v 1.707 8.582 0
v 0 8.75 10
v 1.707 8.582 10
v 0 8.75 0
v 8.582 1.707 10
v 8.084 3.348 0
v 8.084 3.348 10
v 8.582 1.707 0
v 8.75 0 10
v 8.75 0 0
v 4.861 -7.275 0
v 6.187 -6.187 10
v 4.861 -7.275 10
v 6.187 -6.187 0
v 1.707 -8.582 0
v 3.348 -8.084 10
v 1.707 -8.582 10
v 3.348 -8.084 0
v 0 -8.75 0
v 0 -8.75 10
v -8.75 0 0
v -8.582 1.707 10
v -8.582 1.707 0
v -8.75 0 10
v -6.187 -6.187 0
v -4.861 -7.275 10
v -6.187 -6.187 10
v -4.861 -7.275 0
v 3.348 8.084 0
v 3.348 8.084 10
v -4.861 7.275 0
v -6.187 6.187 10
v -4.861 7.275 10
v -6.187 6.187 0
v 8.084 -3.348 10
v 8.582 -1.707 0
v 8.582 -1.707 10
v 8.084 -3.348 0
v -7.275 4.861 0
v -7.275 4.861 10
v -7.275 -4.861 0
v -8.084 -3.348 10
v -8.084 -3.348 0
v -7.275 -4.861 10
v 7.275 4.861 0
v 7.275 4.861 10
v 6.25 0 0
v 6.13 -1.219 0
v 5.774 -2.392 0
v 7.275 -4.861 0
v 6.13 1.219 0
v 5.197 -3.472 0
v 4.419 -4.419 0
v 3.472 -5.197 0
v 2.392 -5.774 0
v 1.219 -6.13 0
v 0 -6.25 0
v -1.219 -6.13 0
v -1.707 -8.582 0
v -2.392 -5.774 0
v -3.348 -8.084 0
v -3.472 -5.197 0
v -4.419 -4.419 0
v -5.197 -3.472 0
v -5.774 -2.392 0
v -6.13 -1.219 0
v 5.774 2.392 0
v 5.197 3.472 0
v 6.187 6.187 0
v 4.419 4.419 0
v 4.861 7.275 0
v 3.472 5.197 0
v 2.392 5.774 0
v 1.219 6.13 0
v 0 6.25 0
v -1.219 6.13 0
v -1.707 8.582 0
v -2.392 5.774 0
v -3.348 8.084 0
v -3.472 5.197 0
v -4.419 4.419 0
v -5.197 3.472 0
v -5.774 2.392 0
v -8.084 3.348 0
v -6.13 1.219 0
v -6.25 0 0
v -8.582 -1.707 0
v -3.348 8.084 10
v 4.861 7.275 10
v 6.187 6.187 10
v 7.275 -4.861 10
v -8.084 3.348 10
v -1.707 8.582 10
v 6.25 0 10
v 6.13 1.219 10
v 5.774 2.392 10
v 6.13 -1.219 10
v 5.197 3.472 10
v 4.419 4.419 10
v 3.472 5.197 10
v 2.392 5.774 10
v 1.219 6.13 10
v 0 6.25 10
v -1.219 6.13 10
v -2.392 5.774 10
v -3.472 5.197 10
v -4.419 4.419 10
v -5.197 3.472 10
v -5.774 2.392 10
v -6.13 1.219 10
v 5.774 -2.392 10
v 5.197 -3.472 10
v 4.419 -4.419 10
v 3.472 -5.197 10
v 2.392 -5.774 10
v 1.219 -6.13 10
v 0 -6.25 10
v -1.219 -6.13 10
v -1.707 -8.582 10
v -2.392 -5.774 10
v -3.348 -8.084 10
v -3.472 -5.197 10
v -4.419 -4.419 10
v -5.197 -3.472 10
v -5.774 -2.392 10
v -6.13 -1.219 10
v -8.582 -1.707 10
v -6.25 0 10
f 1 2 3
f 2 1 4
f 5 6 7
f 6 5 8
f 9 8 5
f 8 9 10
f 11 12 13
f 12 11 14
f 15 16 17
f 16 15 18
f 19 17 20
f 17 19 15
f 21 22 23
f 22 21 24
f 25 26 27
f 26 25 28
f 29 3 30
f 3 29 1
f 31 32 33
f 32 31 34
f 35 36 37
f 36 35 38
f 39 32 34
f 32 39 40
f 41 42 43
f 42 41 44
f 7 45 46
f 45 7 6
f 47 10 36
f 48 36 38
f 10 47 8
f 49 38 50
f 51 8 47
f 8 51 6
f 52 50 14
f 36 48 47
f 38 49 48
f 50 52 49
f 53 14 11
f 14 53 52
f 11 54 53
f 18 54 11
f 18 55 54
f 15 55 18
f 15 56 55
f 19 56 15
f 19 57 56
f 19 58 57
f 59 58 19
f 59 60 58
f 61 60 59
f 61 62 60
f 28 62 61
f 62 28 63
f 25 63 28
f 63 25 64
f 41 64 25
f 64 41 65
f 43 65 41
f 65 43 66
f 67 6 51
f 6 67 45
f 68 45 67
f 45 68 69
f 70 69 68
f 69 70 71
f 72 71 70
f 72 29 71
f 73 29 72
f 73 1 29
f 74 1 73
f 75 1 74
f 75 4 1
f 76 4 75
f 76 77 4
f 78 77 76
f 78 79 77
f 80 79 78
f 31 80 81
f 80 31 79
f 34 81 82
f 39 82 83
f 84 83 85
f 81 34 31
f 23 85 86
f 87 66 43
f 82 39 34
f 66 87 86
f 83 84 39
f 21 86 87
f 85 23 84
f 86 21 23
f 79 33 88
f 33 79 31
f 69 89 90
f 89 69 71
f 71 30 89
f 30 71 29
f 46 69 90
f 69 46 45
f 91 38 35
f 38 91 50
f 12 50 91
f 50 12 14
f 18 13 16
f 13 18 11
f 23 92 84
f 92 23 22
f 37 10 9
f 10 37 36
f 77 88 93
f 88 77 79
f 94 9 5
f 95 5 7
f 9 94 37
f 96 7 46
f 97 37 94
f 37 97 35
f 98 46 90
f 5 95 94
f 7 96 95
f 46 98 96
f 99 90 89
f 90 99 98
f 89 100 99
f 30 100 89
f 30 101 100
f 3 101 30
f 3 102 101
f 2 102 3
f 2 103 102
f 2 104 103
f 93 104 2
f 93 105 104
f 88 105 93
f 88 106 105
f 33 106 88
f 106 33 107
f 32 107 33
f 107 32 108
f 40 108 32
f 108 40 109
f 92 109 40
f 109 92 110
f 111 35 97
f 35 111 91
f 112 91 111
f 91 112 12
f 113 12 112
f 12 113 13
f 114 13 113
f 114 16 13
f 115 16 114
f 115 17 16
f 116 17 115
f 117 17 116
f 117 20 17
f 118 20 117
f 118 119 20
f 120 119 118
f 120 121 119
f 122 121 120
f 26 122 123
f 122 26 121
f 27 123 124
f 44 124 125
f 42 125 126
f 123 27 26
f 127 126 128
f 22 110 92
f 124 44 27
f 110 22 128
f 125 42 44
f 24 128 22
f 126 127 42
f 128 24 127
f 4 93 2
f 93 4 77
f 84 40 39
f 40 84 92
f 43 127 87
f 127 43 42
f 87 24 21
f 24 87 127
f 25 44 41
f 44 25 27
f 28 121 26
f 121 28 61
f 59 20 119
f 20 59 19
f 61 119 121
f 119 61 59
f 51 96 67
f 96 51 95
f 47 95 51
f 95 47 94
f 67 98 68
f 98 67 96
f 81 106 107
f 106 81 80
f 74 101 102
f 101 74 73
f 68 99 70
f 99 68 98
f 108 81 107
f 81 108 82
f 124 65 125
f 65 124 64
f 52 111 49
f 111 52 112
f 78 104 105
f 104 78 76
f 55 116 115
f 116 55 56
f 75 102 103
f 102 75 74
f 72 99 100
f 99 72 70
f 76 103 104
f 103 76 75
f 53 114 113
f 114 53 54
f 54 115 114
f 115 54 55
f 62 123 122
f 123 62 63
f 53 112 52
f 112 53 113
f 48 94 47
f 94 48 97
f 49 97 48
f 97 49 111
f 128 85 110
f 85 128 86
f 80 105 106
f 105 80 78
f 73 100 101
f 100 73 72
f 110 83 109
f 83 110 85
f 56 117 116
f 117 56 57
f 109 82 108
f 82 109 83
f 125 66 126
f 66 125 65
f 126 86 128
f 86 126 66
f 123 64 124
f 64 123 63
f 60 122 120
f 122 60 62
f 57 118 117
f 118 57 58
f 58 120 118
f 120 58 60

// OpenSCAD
$fn = 32;

// ----------------------------------------------------------------------
// Spacer sleeve: 17.5 / 12.5 x 10 mm
// ----------------------------------------------------------------------

// --- parameters (mm) ---
outer_d = 17.5;           // outside diameter
inner_d = 12.5;           // shaft bore
length = 10;              // sleeve length

module sleeve() {
  cylinder(h = length, d = outer_d);
}

difference() {
  sleeve();
  translate([0, 0, -1]) cylinder(h = length + 2, d = inner_d);
}
